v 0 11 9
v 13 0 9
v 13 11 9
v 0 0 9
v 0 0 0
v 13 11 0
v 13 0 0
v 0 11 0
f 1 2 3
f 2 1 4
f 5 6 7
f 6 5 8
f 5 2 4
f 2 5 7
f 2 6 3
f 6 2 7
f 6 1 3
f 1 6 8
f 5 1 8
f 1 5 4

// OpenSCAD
// Generated by SolidPython 1.0.1 on 2020-07-29 00:46:55


cube(size = [13, 11, 9]);
/***********************************************
*********      SolidPython code:      **********
************************************************
 
# import packages: SolidPython
from solid import *
from solid.utils import *
from itertools import chain, combinations, permutations


class Resize:

    def __init__(self, scad_file):
        self.scad_file = scad_file
        #self.scad_file = import_scad(scad_file)
        # cone/cylinder param:
        self.r1 = 0
        self.r2 = 0
        self.h = 0
        # rectangular prism param:
        self.w = 0
        self.l = 0
        # ellipse param:
        self.r = 0

    # import OpenScad code (file name corresponds to shape)


    # classify shape + parameters
    def assign(self, param1, param2, param3):
        if self.scad_file == 'cone.scad':
            self.r1 = param1
            self.r2 = param2
            self.h = param3
        elif self.scad_file == 'cylinder.scad':
            self.r1 = param1
            self.r2 = param2
            self.h = param3
        elif self.scad_file == 'rectangularPrism.scad':
            self.h = param1
            self.l = param2
            self.w = param3
        else:
            self.r = param1
            self.h = param2

    # resize parameters
    def iterate(self):
        x = range(3, 20, 2)
        i = 1
        if self.scad_file == 'cone.scad':
            tempList = list(permutations(x, 2))
            for temp in tempList:
                param1 = temp[0]
                param2 = temp[1]
                filepath = 'produced_scad_files/' + 'cone' + str(param1) + '_' + str(param2) + '_' + '.scad'
                scad_render_to_file(cylinder(h=param1, r1=param2, r2=0), filepath)

        elif self.scad_file == 'cylinder.scad':
            tempList = list(permutations(x, 3))
            for temp in tempList:
                param1 = temp[0]
                param2 = temp[1]
                filepath = 'produced_scad_files/' + 'cylinder' + str(param1) + '_' + str(param2) + '_' + '.scad'
                scad_render_to_file(cylinder(h=param1, r1=param2, r2=param2), filepath)

        elif self.scad_file == 'rectangularPrism.scad':
            tempList = list(permutations(x, 3))
            for temp in tempList:
                param1 = temp[0]
                param2 = temp[1]
                param3 = temp[2]
                filepath = 'produced_scad_files/' + 'rectangularPrism' + str(param1) + '_' + str(param2) + '_' + str(
                    param3) + '.scad'
                scad_render_to_file(cube(size=(param1, param2, param3)), filepath)

        elif self.scad_file == 'ellipse.scad':
            tempList = list(permutations(x, 4))
            for temp in tempList:
                param1 = temp[0]
                param2 = temp[1]
                param3 = temp[2]
                param4 = temp[3]
                filepath = 'produced_scad_files/' + 'ellipse' + str(param1) + '_' + str(param2) + '_' + str(param3) + '_' + str(param4) + '.scad'
                scad_render_to_file(scale([param1, param2, param3])(sphere(r=param4)), filepath)

    def render_to_scadfile(self):
        scad_render_to_file(scad, 'example.scad') 
 
************************************************/
